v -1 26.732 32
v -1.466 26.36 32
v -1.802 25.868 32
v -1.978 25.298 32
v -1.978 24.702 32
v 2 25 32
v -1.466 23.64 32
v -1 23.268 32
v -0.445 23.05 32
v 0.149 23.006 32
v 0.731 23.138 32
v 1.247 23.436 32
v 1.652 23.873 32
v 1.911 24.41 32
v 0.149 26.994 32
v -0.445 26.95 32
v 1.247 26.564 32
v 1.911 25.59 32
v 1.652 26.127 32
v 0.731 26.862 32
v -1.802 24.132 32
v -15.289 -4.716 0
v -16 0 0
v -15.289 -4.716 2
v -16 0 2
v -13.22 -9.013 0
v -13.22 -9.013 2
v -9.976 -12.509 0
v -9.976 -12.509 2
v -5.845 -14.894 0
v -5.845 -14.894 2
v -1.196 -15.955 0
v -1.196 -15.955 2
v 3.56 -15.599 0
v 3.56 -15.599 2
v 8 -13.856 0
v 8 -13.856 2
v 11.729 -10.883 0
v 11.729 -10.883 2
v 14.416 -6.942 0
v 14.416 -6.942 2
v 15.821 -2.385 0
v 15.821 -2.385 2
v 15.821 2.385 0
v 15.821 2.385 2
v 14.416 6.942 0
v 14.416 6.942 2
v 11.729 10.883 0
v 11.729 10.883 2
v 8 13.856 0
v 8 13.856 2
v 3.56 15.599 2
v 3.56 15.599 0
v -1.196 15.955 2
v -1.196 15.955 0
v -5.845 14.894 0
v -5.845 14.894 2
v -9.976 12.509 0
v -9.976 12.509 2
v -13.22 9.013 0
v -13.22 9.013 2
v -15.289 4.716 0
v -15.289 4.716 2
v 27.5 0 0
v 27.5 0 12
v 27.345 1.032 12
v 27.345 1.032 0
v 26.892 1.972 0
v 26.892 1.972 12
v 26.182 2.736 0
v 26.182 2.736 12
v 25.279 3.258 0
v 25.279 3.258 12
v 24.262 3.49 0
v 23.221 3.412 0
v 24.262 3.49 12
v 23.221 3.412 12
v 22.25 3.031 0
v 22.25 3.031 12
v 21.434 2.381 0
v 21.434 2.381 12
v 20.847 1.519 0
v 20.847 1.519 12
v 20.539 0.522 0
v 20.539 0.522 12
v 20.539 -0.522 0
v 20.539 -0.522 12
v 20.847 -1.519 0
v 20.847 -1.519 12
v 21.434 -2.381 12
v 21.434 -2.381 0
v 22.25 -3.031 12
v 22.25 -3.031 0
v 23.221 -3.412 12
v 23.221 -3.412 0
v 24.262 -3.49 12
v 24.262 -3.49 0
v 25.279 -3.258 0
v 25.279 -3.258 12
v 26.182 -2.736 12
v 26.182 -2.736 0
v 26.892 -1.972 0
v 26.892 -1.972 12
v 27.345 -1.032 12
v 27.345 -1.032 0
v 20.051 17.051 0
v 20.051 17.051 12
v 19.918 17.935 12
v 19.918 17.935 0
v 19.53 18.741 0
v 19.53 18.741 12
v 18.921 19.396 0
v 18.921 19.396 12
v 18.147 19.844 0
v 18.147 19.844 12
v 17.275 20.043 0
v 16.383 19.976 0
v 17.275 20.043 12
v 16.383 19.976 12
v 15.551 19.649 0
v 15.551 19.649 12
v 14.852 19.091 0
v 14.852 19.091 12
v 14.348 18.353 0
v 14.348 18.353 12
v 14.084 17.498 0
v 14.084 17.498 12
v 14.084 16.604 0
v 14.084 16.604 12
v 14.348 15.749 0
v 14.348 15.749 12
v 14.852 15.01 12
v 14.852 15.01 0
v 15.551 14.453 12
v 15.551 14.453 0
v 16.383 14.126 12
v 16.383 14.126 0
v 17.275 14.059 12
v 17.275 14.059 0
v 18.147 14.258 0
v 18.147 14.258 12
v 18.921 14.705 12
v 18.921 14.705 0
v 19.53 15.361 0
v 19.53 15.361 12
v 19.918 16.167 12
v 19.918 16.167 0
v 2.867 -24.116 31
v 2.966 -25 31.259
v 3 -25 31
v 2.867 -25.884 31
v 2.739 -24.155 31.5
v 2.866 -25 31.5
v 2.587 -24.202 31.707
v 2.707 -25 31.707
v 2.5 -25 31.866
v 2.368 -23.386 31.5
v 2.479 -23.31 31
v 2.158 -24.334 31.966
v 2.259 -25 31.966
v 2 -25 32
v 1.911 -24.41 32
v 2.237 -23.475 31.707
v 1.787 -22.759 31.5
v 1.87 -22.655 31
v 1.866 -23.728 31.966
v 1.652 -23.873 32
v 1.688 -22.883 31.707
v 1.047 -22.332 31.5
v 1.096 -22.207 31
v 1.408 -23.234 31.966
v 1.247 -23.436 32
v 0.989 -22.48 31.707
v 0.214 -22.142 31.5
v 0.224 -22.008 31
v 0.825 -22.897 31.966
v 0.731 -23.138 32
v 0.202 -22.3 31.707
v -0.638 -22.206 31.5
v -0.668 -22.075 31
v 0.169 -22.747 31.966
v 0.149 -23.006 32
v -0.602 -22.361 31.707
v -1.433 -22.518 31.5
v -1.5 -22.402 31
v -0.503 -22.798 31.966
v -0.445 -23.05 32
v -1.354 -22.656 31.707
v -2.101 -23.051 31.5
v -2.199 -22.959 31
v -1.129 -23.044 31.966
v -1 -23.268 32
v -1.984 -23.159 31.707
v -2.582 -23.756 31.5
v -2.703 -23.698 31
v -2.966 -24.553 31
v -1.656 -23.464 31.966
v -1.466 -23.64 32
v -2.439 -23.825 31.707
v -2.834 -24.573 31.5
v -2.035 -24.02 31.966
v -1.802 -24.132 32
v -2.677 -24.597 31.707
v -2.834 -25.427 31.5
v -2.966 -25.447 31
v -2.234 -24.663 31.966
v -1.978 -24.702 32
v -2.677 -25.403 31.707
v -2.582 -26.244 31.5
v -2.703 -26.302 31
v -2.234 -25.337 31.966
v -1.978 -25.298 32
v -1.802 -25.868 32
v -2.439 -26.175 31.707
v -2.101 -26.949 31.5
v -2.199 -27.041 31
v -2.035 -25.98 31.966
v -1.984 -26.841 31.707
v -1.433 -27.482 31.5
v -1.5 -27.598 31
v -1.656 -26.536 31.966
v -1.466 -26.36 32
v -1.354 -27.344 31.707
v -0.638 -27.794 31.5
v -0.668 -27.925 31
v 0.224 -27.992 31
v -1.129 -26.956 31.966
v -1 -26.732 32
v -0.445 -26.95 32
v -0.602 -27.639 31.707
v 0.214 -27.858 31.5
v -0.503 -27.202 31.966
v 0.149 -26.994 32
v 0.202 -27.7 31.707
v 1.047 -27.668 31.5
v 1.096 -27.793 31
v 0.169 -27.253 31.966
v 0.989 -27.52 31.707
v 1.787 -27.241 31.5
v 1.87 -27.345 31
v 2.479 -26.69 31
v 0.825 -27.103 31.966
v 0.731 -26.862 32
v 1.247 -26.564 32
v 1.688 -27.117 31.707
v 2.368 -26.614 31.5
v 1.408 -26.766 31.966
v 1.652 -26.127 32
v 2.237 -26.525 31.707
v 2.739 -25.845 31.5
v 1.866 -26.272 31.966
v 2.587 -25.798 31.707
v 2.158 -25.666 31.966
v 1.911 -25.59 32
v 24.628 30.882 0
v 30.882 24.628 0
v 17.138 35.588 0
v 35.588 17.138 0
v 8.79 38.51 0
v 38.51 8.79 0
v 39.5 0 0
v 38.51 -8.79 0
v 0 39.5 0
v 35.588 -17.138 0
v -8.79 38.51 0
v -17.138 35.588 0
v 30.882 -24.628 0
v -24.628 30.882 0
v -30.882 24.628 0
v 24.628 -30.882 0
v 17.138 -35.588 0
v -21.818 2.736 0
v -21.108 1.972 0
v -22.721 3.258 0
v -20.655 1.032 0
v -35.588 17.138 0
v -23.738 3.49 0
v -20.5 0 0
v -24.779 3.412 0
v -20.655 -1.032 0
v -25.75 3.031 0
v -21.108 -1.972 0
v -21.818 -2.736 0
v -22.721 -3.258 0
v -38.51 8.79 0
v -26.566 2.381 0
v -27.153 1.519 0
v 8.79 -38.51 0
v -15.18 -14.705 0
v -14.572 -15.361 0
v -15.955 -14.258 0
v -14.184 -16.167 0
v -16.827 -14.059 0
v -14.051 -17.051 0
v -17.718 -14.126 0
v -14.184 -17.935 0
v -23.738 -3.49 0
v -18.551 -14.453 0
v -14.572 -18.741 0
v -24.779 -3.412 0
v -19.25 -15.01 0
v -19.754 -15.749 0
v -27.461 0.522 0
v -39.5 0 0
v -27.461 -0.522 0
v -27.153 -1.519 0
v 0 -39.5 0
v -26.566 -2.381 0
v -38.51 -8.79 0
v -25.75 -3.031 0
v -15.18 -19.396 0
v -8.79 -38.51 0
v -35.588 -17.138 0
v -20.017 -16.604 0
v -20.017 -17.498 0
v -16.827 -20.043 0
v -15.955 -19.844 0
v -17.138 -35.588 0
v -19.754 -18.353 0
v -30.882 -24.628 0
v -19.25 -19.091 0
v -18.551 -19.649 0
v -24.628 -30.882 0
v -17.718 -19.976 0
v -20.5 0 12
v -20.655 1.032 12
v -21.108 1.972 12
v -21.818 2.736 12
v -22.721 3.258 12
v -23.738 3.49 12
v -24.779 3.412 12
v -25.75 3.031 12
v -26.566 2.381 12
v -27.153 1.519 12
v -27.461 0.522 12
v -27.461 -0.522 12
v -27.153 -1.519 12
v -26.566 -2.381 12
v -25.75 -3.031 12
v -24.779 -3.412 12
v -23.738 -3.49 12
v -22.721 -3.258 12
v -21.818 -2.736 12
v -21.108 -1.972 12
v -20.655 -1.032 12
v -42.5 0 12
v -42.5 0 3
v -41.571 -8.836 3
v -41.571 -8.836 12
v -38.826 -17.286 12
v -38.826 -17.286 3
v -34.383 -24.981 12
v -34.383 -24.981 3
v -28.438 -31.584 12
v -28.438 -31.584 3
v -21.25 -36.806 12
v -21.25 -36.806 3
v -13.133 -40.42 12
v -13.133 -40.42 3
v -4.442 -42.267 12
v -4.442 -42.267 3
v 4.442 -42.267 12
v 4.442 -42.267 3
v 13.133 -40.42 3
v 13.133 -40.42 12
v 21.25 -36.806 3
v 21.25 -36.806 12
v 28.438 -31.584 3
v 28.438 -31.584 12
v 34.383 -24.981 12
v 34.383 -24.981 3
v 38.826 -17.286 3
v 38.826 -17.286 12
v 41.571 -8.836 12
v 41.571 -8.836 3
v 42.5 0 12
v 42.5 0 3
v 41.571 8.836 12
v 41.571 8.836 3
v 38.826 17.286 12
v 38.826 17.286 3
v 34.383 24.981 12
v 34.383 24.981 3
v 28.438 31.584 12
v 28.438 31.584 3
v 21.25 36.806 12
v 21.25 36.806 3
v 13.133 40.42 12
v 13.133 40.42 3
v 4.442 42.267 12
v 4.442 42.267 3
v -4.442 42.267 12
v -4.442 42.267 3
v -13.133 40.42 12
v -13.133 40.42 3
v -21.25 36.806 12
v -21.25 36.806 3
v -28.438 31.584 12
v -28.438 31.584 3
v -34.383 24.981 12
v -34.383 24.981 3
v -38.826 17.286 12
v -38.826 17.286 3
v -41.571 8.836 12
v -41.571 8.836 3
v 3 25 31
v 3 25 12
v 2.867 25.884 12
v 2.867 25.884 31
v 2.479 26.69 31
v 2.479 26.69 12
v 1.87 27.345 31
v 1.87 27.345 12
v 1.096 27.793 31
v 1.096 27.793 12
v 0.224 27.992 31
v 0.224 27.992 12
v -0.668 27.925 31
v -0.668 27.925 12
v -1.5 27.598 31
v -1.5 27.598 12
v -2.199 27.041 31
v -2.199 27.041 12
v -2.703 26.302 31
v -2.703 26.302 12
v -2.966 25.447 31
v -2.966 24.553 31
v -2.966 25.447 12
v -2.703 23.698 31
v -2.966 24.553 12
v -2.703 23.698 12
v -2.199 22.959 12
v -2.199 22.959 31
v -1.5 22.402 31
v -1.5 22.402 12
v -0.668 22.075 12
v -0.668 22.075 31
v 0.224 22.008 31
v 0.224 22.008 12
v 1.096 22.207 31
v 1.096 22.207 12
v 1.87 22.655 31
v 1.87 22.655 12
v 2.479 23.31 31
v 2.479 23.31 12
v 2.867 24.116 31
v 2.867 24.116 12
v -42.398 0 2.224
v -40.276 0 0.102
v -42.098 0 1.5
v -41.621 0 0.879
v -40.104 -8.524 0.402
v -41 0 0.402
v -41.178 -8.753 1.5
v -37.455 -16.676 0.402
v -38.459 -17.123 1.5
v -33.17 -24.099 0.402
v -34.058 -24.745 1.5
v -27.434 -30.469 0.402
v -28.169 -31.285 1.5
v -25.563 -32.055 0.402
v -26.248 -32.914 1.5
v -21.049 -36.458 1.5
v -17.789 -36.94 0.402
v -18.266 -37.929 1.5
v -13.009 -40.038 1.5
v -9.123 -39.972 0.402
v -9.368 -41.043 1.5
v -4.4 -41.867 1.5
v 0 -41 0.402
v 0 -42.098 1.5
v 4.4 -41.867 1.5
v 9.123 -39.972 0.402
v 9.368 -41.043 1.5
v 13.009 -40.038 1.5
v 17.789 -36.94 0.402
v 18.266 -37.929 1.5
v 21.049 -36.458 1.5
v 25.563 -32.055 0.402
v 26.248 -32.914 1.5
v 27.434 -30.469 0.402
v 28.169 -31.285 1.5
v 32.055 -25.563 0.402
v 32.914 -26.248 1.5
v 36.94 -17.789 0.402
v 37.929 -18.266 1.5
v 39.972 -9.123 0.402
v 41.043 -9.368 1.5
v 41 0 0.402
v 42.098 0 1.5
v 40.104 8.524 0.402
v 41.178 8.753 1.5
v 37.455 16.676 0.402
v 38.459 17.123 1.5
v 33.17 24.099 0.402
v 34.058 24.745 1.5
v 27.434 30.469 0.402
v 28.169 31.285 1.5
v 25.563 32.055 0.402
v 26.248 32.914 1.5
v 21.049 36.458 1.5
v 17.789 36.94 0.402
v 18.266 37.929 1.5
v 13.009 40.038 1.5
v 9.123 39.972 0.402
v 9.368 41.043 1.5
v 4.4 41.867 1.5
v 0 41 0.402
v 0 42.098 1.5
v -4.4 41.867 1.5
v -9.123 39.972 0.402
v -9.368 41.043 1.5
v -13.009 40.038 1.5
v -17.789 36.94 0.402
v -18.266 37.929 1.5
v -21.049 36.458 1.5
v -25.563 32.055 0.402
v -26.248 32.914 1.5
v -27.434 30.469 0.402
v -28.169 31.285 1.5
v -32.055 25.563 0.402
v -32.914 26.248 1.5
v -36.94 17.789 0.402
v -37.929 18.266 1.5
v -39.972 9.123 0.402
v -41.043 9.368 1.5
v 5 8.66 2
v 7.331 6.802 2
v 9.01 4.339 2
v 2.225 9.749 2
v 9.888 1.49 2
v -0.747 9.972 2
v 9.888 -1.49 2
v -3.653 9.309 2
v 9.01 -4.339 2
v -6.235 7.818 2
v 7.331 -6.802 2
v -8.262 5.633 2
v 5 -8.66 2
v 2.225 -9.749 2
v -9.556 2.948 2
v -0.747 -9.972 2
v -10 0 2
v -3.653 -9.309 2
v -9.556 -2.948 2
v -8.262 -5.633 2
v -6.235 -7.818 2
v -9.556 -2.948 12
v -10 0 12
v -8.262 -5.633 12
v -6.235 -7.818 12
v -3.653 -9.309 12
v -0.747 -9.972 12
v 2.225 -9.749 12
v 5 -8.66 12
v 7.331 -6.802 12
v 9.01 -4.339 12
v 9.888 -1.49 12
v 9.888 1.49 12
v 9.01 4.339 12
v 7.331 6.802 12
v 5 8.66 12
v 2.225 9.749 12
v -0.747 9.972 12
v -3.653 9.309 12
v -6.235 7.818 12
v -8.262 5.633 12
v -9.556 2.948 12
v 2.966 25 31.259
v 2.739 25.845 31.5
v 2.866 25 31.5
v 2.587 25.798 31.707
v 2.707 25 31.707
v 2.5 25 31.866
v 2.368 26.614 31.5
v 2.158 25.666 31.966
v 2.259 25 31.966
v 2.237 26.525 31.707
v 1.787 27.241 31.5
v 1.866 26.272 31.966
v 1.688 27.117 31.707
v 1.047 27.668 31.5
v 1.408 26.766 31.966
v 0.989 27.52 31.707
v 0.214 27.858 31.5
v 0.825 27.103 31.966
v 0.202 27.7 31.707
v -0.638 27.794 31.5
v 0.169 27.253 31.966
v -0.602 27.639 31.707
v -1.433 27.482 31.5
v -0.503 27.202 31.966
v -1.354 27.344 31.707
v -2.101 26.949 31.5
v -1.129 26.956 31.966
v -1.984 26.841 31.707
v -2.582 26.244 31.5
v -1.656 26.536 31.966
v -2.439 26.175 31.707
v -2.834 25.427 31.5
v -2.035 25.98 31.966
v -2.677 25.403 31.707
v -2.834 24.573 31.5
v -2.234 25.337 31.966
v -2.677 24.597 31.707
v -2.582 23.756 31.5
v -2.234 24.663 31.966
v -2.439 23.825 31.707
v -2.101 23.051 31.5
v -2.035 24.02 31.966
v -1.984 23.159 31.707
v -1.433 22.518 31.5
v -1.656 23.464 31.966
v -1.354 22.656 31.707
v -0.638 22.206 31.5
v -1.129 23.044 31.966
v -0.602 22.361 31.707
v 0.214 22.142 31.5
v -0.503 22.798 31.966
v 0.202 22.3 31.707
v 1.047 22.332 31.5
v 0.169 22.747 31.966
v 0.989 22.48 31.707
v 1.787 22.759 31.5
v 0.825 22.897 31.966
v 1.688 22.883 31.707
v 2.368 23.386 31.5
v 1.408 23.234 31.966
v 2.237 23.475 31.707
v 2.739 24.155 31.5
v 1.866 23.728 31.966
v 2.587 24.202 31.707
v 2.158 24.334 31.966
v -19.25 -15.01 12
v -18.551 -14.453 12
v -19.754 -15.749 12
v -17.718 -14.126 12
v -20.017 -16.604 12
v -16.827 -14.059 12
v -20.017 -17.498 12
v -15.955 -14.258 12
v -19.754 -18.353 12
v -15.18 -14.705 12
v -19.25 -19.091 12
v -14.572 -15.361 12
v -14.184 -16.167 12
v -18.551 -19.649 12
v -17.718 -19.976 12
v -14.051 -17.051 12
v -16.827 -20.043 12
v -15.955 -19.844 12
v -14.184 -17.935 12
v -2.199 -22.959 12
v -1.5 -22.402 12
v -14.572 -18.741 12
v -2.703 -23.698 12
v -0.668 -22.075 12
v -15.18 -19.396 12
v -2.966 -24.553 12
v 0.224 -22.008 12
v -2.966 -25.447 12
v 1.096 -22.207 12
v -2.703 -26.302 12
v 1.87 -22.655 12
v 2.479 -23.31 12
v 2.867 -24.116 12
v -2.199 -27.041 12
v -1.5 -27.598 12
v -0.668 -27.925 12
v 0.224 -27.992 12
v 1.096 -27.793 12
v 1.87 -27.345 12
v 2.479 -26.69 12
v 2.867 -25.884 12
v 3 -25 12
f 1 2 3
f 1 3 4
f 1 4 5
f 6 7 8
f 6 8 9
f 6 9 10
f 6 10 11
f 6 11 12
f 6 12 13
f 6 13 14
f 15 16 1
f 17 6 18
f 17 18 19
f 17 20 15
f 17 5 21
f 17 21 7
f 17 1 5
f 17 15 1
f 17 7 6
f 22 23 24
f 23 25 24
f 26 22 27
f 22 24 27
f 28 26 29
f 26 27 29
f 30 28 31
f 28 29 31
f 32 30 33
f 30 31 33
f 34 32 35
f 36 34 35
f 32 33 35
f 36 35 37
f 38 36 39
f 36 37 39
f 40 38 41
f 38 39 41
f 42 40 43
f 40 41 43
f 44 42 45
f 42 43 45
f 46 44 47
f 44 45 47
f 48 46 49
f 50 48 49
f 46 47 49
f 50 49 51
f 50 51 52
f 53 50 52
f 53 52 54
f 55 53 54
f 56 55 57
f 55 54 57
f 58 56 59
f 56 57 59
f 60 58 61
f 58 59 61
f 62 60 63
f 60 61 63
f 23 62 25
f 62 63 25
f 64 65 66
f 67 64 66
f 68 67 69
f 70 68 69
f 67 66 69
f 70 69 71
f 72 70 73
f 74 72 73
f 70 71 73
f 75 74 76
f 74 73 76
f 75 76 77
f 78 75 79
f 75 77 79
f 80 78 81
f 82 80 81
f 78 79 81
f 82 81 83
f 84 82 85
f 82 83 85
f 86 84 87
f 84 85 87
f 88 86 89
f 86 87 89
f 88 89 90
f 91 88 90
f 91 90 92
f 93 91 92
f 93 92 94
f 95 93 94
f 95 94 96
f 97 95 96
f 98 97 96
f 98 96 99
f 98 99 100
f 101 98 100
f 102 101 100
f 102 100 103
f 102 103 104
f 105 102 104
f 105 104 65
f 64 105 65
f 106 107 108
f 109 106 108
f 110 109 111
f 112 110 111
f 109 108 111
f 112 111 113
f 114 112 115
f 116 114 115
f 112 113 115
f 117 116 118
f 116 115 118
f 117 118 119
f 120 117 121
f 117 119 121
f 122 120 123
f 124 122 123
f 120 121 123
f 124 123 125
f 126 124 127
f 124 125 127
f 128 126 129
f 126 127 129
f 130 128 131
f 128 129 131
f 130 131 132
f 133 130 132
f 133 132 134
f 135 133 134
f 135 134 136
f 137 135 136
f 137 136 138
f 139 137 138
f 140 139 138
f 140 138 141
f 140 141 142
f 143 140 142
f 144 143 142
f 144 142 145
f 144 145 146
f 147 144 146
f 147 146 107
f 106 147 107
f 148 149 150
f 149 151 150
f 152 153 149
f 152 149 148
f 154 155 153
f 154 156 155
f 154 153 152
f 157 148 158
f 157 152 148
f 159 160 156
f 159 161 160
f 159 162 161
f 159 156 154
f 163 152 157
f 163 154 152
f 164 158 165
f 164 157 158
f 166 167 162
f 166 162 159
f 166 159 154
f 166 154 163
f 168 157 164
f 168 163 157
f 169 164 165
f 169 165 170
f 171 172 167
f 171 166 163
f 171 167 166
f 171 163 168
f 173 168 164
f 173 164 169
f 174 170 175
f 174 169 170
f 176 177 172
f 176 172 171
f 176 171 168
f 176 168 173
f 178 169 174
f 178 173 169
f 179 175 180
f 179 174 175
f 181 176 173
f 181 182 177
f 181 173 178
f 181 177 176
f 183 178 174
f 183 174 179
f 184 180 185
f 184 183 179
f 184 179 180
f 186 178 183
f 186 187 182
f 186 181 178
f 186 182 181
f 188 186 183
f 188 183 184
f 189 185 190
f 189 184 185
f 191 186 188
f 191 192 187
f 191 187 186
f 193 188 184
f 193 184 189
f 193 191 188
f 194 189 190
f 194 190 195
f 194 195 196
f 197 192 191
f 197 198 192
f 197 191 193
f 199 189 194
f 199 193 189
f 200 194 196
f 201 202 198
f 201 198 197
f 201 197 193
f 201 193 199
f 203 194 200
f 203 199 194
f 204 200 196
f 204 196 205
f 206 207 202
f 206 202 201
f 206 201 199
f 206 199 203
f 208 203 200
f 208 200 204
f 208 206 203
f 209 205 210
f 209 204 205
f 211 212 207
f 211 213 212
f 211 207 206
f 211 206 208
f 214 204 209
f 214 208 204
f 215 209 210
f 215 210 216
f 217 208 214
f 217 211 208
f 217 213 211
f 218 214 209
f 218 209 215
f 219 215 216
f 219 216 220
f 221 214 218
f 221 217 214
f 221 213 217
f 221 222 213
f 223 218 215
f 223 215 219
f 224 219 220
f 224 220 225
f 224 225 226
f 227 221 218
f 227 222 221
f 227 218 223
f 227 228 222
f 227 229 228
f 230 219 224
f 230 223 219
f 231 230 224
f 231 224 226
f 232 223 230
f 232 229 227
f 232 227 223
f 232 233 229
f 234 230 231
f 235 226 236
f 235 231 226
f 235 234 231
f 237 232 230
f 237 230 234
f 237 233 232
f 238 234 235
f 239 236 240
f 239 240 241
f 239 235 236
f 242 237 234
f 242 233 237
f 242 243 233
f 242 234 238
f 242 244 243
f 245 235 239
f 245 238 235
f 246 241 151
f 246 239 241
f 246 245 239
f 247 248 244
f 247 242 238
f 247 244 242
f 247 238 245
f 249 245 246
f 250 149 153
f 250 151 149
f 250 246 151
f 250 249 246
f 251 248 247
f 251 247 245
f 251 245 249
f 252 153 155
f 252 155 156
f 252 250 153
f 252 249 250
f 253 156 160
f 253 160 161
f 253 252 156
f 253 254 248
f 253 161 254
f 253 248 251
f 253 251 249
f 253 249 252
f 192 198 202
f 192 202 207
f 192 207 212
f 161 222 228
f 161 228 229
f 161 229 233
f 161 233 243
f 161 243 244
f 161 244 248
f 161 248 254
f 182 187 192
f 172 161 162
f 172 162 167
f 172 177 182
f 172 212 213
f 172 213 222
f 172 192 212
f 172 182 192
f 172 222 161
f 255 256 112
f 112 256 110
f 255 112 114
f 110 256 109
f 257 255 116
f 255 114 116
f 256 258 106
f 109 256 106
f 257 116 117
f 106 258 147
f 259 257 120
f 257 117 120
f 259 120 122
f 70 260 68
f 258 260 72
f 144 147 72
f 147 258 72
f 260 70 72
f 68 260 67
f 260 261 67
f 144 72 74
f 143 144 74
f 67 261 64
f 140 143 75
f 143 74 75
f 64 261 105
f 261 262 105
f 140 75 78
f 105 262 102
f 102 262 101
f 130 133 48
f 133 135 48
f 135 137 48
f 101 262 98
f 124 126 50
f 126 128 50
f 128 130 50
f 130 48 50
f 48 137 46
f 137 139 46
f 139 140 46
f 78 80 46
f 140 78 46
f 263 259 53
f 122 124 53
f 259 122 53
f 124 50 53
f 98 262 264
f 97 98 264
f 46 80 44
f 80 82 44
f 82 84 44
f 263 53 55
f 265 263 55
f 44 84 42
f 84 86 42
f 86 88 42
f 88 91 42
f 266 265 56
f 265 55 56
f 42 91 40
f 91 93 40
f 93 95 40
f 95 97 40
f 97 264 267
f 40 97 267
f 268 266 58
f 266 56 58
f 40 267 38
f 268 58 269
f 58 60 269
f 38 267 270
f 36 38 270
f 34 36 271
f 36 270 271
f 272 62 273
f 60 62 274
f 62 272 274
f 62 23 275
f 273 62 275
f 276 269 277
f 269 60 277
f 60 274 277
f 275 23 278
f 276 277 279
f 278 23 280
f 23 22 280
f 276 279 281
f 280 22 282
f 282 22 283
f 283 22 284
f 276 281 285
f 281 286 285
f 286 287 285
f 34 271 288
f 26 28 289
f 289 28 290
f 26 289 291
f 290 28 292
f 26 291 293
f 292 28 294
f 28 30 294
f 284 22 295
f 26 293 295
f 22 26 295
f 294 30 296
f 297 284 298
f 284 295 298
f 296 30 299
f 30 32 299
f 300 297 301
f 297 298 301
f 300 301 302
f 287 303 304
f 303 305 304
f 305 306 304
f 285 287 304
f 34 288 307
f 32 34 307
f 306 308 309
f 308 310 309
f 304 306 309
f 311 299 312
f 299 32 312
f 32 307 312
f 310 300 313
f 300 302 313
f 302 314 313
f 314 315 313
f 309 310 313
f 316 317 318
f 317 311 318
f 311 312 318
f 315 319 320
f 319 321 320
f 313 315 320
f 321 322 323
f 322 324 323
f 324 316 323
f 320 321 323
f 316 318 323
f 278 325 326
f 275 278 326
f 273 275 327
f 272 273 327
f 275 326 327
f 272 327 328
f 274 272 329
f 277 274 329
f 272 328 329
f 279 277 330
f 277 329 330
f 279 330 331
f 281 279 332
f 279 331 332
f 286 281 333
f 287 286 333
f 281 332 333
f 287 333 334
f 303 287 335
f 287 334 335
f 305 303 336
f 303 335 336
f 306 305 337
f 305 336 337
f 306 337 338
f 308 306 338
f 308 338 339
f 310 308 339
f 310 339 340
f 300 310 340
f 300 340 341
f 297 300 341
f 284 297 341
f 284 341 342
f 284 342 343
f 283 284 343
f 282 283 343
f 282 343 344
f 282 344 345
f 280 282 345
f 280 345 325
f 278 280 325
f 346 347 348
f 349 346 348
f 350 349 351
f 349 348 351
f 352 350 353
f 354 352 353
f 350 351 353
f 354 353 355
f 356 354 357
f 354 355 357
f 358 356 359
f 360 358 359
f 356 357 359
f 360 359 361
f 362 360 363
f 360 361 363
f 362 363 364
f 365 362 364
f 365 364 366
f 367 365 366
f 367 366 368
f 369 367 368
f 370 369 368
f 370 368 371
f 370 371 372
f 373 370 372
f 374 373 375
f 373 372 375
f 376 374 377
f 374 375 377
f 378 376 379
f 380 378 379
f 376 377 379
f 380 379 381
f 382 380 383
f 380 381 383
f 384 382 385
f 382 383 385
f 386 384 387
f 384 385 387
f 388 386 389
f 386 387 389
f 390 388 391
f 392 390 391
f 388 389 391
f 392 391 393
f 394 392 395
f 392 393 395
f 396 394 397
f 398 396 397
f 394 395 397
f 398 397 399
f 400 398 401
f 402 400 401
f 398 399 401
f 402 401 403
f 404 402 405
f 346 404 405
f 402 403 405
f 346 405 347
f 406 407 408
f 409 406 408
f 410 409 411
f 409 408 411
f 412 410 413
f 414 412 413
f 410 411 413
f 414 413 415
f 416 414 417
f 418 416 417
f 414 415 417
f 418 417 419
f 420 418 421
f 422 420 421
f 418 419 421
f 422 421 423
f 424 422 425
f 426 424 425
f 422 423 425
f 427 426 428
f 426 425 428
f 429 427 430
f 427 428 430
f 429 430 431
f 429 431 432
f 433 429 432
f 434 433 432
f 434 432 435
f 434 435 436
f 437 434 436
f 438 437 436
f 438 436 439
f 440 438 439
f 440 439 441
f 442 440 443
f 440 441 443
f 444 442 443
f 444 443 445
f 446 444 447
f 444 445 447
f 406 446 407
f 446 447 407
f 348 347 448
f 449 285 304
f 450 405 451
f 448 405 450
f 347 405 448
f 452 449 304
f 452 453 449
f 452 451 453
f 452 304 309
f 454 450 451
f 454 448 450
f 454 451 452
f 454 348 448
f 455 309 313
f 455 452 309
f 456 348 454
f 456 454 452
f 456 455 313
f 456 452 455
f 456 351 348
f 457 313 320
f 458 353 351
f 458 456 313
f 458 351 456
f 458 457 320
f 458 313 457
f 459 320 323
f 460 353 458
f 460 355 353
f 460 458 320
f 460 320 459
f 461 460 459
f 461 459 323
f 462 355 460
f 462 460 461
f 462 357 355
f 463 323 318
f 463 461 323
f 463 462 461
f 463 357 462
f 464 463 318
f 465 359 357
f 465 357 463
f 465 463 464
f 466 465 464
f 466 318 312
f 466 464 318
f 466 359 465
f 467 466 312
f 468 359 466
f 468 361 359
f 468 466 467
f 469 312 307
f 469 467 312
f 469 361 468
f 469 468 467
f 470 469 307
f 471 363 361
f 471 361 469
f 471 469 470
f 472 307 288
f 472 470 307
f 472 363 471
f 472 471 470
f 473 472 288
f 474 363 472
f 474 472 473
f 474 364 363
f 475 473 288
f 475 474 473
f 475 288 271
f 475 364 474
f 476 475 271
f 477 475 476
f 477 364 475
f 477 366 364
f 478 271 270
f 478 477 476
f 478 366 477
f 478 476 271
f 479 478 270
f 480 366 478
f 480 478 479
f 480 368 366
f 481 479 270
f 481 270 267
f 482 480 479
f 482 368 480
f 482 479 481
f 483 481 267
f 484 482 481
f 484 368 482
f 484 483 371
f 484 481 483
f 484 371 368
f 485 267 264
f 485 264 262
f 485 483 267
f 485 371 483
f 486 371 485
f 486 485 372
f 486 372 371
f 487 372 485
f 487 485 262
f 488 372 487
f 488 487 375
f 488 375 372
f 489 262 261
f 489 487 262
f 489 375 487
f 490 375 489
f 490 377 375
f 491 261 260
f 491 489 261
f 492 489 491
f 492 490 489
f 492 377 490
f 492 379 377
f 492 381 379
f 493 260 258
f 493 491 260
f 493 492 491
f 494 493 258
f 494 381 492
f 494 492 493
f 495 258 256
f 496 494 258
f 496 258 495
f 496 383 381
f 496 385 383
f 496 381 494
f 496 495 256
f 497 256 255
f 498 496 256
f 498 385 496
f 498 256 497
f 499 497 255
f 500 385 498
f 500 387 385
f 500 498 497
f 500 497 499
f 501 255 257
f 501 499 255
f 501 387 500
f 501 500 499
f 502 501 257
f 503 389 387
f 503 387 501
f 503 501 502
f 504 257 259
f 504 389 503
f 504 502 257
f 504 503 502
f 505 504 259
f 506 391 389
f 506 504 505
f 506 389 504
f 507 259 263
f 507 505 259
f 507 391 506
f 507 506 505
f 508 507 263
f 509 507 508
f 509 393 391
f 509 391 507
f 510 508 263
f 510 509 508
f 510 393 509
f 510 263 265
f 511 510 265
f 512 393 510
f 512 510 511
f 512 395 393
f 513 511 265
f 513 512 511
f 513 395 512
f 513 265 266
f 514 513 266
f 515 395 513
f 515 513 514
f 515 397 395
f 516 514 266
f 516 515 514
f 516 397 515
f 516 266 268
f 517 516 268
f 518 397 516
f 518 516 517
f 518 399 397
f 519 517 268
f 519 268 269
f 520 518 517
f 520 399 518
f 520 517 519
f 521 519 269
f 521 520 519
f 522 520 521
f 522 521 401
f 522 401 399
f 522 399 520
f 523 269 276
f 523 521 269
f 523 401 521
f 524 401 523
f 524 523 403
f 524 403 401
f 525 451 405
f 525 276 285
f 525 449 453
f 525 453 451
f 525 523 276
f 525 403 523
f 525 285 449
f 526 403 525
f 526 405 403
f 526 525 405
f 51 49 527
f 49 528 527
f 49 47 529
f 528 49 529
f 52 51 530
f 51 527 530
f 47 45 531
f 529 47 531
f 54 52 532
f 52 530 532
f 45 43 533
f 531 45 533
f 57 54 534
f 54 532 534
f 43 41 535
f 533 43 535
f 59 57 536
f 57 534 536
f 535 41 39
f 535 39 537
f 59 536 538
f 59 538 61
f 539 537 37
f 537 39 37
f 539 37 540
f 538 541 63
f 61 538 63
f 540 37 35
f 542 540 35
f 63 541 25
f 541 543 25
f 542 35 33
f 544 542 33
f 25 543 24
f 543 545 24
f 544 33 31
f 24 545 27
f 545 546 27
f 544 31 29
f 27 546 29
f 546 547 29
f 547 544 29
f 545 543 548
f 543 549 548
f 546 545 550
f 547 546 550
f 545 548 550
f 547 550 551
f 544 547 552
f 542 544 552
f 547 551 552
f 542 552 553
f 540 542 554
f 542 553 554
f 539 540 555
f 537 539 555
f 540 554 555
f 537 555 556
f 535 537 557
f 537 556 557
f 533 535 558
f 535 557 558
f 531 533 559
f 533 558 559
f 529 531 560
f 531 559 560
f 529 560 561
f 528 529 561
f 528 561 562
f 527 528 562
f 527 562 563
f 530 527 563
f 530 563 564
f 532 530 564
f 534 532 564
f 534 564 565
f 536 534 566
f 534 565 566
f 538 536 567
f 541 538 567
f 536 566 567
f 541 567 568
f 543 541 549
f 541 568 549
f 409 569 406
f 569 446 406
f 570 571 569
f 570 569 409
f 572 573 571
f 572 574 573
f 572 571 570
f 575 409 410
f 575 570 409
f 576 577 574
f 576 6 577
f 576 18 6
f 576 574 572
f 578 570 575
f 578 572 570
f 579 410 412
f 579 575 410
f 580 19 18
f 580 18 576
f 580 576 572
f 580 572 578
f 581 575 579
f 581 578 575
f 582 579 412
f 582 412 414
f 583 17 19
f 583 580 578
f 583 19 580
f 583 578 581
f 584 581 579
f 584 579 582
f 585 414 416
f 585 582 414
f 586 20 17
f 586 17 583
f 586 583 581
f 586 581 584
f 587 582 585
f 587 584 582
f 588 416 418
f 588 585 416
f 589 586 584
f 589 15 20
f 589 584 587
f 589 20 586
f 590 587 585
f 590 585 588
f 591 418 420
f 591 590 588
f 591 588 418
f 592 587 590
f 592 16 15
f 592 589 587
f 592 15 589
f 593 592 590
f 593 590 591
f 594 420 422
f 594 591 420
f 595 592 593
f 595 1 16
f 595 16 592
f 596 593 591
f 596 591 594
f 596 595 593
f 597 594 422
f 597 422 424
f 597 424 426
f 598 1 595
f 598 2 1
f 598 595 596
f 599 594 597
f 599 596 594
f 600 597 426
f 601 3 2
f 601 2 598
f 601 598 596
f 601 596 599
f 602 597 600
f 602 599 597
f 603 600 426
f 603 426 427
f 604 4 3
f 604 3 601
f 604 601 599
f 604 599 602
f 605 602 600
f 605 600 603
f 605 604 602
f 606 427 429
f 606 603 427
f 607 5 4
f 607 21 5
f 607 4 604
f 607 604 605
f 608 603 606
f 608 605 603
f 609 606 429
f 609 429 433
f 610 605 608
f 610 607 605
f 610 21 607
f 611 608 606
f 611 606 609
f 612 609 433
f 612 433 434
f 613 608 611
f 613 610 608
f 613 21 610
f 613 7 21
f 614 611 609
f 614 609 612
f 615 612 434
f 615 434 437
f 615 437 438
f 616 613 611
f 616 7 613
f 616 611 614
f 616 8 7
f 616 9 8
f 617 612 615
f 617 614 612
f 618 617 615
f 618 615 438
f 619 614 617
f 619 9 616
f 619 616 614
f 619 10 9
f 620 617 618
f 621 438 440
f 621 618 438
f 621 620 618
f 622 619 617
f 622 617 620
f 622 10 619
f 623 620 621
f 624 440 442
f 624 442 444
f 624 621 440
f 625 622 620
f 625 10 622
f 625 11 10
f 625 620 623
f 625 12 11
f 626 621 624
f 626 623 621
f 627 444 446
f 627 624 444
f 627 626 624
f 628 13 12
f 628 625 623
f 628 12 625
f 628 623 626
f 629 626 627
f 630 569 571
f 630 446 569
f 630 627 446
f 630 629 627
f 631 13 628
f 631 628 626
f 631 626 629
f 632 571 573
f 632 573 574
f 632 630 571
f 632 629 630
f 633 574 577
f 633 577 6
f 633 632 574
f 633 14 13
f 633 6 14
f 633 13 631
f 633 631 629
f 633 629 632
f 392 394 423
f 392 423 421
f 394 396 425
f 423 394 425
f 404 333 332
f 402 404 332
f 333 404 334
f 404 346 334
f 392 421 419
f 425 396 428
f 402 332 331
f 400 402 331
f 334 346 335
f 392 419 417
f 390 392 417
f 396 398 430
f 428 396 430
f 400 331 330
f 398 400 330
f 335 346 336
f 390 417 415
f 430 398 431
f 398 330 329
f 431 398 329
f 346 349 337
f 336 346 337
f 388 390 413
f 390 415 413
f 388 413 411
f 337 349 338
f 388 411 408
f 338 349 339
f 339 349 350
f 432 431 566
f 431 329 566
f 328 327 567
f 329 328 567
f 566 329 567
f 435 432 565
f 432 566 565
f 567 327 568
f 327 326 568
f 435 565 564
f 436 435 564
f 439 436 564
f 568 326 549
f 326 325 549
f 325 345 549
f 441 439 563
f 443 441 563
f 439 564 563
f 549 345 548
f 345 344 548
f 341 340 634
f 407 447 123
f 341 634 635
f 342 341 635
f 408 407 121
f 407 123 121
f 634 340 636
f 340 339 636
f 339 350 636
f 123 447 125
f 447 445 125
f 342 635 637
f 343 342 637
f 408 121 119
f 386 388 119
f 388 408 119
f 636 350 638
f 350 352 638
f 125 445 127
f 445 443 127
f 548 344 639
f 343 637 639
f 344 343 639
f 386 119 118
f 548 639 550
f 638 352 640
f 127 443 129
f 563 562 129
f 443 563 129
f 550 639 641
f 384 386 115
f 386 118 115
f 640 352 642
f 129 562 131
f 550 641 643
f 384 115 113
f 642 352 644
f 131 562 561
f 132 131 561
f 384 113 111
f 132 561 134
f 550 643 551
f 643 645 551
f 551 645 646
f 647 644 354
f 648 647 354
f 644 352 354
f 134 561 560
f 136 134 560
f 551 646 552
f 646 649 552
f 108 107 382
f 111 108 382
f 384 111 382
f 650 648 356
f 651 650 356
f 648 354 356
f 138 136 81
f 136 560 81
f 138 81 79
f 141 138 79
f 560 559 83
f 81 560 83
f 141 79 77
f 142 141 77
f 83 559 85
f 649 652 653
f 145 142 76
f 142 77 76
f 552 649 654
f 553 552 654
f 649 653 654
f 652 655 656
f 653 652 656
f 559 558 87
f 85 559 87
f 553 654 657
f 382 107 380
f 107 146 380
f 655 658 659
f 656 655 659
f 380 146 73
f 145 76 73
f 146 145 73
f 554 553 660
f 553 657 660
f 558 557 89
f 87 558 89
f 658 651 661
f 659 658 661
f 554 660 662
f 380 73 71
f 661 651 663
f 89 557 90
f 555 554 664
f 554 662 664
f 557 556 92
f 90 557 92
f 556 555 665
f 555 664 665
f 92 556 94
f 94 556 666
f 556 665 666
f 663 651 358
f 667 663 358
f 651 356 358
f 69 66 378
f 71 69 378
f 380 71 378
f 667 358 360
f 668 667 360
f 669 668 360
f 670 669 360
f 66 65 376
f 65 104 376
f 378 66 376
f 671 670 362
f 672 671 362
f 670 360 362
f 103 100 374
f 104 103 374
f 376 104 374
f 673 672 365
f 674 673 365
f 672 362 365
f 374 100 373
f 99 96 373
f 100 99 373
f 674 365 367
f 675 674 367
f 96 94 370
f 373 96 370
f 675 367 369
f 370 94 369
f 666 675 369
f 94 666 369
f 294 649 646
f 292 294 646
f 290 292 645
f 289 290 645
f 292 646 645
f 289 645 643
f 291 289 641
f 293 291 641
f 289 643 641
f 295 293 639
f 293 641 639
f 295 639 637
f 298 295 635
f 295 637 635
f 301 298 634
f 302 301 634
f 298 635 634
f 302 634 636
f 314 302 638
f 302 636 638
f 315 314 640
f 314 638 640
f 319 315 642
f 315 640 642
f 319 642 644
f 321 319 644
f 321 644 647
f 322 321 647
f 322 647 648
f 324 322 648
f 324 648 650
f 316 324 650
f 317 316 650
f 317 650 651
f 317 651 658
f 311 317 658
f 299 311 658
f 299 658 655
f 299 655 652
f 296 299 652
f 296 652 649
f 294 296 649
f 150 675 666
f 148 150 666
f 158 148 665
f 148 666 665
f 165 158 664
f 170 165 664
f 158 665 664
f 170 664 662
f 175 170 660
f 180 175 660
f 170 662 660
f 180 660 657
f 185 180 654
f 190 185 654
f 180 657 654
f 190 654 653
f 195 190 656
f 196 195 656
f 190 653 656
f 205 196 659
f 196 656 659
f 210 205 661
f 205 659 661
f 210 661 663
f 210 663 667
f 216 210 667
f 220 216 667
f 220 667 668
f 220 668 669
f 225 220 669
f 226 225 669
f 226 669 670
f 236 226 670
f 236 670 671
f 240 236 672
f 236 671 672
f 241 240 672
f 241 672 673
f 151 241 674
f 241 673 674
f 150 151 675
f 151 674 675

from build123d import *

# Parameters (mm, degrees)
F2_R     = 3
F3_R     = 3.5
F4_DEPTH = 25
F3_R_2   = 3
F5_DEPTH = 20
F6_R     = 1
F7_R     = 3
F8_DEPTH = 25


with BuildPart() as f1:
    # F0 (on Front) → F1 (revolve)
    with BuildSketch(Plane.XZ):
        Polygon((-42.5, 0), (-16, 0), (-16, 2), (-10, 2), (-10, 12), (-42.5, 12), align=None)
    revolve(axis=Axis((0, 0, 19.633664), (0, 0, 1)))

    # F2
    f2_edges = [f1.edges().sort_by_distance(p)[0] for p in [
        (42.5, 0, 0),
    ]]
    fillet(f2_edges, radius=F2_R)

    # F3 (on face) → F4 (cut)
    with BuildSketch(Plane.XY.offset(12)):
        with Locations((-24, 0)):
            Circle(F3_R)
        with Locations((24, 0)):
            Circle(F3_R)
    extrude(amount=-F4_DEPTH, mode=Mode.SUBTRACT)

    # F3 (on face) → F5 (join)
    with BuildSketch(Plane.XY.offset(12)):
        with Locations((0, -25)):
            Circle(F3_R_2)
        with Locations((0, 25)):
            Circle(F3_R_2)
    extrude(amount=F5_DEPTH)

    # F6
    f6_edges = [f1.edges().sort_by_distance(p)[0] for p in [
        (-3, -25, 32),
        (-3, 25, 32),
    ]]
    fillet(f6_edges, radius=F6_R)

    # F7 (on face) → F8 (cut)
    with BuildSketch(Plane.XY.offset(12)):
        with Locations((-17.050904, -17.050904)):
            Circle(F7_R)
        with Locations((17.050904, 17.050904)):
            Circle(F7_R)
    extrude(amount=-F8_DEPTH, mode=Mode.SUBTRACT)


solid = f1.part
